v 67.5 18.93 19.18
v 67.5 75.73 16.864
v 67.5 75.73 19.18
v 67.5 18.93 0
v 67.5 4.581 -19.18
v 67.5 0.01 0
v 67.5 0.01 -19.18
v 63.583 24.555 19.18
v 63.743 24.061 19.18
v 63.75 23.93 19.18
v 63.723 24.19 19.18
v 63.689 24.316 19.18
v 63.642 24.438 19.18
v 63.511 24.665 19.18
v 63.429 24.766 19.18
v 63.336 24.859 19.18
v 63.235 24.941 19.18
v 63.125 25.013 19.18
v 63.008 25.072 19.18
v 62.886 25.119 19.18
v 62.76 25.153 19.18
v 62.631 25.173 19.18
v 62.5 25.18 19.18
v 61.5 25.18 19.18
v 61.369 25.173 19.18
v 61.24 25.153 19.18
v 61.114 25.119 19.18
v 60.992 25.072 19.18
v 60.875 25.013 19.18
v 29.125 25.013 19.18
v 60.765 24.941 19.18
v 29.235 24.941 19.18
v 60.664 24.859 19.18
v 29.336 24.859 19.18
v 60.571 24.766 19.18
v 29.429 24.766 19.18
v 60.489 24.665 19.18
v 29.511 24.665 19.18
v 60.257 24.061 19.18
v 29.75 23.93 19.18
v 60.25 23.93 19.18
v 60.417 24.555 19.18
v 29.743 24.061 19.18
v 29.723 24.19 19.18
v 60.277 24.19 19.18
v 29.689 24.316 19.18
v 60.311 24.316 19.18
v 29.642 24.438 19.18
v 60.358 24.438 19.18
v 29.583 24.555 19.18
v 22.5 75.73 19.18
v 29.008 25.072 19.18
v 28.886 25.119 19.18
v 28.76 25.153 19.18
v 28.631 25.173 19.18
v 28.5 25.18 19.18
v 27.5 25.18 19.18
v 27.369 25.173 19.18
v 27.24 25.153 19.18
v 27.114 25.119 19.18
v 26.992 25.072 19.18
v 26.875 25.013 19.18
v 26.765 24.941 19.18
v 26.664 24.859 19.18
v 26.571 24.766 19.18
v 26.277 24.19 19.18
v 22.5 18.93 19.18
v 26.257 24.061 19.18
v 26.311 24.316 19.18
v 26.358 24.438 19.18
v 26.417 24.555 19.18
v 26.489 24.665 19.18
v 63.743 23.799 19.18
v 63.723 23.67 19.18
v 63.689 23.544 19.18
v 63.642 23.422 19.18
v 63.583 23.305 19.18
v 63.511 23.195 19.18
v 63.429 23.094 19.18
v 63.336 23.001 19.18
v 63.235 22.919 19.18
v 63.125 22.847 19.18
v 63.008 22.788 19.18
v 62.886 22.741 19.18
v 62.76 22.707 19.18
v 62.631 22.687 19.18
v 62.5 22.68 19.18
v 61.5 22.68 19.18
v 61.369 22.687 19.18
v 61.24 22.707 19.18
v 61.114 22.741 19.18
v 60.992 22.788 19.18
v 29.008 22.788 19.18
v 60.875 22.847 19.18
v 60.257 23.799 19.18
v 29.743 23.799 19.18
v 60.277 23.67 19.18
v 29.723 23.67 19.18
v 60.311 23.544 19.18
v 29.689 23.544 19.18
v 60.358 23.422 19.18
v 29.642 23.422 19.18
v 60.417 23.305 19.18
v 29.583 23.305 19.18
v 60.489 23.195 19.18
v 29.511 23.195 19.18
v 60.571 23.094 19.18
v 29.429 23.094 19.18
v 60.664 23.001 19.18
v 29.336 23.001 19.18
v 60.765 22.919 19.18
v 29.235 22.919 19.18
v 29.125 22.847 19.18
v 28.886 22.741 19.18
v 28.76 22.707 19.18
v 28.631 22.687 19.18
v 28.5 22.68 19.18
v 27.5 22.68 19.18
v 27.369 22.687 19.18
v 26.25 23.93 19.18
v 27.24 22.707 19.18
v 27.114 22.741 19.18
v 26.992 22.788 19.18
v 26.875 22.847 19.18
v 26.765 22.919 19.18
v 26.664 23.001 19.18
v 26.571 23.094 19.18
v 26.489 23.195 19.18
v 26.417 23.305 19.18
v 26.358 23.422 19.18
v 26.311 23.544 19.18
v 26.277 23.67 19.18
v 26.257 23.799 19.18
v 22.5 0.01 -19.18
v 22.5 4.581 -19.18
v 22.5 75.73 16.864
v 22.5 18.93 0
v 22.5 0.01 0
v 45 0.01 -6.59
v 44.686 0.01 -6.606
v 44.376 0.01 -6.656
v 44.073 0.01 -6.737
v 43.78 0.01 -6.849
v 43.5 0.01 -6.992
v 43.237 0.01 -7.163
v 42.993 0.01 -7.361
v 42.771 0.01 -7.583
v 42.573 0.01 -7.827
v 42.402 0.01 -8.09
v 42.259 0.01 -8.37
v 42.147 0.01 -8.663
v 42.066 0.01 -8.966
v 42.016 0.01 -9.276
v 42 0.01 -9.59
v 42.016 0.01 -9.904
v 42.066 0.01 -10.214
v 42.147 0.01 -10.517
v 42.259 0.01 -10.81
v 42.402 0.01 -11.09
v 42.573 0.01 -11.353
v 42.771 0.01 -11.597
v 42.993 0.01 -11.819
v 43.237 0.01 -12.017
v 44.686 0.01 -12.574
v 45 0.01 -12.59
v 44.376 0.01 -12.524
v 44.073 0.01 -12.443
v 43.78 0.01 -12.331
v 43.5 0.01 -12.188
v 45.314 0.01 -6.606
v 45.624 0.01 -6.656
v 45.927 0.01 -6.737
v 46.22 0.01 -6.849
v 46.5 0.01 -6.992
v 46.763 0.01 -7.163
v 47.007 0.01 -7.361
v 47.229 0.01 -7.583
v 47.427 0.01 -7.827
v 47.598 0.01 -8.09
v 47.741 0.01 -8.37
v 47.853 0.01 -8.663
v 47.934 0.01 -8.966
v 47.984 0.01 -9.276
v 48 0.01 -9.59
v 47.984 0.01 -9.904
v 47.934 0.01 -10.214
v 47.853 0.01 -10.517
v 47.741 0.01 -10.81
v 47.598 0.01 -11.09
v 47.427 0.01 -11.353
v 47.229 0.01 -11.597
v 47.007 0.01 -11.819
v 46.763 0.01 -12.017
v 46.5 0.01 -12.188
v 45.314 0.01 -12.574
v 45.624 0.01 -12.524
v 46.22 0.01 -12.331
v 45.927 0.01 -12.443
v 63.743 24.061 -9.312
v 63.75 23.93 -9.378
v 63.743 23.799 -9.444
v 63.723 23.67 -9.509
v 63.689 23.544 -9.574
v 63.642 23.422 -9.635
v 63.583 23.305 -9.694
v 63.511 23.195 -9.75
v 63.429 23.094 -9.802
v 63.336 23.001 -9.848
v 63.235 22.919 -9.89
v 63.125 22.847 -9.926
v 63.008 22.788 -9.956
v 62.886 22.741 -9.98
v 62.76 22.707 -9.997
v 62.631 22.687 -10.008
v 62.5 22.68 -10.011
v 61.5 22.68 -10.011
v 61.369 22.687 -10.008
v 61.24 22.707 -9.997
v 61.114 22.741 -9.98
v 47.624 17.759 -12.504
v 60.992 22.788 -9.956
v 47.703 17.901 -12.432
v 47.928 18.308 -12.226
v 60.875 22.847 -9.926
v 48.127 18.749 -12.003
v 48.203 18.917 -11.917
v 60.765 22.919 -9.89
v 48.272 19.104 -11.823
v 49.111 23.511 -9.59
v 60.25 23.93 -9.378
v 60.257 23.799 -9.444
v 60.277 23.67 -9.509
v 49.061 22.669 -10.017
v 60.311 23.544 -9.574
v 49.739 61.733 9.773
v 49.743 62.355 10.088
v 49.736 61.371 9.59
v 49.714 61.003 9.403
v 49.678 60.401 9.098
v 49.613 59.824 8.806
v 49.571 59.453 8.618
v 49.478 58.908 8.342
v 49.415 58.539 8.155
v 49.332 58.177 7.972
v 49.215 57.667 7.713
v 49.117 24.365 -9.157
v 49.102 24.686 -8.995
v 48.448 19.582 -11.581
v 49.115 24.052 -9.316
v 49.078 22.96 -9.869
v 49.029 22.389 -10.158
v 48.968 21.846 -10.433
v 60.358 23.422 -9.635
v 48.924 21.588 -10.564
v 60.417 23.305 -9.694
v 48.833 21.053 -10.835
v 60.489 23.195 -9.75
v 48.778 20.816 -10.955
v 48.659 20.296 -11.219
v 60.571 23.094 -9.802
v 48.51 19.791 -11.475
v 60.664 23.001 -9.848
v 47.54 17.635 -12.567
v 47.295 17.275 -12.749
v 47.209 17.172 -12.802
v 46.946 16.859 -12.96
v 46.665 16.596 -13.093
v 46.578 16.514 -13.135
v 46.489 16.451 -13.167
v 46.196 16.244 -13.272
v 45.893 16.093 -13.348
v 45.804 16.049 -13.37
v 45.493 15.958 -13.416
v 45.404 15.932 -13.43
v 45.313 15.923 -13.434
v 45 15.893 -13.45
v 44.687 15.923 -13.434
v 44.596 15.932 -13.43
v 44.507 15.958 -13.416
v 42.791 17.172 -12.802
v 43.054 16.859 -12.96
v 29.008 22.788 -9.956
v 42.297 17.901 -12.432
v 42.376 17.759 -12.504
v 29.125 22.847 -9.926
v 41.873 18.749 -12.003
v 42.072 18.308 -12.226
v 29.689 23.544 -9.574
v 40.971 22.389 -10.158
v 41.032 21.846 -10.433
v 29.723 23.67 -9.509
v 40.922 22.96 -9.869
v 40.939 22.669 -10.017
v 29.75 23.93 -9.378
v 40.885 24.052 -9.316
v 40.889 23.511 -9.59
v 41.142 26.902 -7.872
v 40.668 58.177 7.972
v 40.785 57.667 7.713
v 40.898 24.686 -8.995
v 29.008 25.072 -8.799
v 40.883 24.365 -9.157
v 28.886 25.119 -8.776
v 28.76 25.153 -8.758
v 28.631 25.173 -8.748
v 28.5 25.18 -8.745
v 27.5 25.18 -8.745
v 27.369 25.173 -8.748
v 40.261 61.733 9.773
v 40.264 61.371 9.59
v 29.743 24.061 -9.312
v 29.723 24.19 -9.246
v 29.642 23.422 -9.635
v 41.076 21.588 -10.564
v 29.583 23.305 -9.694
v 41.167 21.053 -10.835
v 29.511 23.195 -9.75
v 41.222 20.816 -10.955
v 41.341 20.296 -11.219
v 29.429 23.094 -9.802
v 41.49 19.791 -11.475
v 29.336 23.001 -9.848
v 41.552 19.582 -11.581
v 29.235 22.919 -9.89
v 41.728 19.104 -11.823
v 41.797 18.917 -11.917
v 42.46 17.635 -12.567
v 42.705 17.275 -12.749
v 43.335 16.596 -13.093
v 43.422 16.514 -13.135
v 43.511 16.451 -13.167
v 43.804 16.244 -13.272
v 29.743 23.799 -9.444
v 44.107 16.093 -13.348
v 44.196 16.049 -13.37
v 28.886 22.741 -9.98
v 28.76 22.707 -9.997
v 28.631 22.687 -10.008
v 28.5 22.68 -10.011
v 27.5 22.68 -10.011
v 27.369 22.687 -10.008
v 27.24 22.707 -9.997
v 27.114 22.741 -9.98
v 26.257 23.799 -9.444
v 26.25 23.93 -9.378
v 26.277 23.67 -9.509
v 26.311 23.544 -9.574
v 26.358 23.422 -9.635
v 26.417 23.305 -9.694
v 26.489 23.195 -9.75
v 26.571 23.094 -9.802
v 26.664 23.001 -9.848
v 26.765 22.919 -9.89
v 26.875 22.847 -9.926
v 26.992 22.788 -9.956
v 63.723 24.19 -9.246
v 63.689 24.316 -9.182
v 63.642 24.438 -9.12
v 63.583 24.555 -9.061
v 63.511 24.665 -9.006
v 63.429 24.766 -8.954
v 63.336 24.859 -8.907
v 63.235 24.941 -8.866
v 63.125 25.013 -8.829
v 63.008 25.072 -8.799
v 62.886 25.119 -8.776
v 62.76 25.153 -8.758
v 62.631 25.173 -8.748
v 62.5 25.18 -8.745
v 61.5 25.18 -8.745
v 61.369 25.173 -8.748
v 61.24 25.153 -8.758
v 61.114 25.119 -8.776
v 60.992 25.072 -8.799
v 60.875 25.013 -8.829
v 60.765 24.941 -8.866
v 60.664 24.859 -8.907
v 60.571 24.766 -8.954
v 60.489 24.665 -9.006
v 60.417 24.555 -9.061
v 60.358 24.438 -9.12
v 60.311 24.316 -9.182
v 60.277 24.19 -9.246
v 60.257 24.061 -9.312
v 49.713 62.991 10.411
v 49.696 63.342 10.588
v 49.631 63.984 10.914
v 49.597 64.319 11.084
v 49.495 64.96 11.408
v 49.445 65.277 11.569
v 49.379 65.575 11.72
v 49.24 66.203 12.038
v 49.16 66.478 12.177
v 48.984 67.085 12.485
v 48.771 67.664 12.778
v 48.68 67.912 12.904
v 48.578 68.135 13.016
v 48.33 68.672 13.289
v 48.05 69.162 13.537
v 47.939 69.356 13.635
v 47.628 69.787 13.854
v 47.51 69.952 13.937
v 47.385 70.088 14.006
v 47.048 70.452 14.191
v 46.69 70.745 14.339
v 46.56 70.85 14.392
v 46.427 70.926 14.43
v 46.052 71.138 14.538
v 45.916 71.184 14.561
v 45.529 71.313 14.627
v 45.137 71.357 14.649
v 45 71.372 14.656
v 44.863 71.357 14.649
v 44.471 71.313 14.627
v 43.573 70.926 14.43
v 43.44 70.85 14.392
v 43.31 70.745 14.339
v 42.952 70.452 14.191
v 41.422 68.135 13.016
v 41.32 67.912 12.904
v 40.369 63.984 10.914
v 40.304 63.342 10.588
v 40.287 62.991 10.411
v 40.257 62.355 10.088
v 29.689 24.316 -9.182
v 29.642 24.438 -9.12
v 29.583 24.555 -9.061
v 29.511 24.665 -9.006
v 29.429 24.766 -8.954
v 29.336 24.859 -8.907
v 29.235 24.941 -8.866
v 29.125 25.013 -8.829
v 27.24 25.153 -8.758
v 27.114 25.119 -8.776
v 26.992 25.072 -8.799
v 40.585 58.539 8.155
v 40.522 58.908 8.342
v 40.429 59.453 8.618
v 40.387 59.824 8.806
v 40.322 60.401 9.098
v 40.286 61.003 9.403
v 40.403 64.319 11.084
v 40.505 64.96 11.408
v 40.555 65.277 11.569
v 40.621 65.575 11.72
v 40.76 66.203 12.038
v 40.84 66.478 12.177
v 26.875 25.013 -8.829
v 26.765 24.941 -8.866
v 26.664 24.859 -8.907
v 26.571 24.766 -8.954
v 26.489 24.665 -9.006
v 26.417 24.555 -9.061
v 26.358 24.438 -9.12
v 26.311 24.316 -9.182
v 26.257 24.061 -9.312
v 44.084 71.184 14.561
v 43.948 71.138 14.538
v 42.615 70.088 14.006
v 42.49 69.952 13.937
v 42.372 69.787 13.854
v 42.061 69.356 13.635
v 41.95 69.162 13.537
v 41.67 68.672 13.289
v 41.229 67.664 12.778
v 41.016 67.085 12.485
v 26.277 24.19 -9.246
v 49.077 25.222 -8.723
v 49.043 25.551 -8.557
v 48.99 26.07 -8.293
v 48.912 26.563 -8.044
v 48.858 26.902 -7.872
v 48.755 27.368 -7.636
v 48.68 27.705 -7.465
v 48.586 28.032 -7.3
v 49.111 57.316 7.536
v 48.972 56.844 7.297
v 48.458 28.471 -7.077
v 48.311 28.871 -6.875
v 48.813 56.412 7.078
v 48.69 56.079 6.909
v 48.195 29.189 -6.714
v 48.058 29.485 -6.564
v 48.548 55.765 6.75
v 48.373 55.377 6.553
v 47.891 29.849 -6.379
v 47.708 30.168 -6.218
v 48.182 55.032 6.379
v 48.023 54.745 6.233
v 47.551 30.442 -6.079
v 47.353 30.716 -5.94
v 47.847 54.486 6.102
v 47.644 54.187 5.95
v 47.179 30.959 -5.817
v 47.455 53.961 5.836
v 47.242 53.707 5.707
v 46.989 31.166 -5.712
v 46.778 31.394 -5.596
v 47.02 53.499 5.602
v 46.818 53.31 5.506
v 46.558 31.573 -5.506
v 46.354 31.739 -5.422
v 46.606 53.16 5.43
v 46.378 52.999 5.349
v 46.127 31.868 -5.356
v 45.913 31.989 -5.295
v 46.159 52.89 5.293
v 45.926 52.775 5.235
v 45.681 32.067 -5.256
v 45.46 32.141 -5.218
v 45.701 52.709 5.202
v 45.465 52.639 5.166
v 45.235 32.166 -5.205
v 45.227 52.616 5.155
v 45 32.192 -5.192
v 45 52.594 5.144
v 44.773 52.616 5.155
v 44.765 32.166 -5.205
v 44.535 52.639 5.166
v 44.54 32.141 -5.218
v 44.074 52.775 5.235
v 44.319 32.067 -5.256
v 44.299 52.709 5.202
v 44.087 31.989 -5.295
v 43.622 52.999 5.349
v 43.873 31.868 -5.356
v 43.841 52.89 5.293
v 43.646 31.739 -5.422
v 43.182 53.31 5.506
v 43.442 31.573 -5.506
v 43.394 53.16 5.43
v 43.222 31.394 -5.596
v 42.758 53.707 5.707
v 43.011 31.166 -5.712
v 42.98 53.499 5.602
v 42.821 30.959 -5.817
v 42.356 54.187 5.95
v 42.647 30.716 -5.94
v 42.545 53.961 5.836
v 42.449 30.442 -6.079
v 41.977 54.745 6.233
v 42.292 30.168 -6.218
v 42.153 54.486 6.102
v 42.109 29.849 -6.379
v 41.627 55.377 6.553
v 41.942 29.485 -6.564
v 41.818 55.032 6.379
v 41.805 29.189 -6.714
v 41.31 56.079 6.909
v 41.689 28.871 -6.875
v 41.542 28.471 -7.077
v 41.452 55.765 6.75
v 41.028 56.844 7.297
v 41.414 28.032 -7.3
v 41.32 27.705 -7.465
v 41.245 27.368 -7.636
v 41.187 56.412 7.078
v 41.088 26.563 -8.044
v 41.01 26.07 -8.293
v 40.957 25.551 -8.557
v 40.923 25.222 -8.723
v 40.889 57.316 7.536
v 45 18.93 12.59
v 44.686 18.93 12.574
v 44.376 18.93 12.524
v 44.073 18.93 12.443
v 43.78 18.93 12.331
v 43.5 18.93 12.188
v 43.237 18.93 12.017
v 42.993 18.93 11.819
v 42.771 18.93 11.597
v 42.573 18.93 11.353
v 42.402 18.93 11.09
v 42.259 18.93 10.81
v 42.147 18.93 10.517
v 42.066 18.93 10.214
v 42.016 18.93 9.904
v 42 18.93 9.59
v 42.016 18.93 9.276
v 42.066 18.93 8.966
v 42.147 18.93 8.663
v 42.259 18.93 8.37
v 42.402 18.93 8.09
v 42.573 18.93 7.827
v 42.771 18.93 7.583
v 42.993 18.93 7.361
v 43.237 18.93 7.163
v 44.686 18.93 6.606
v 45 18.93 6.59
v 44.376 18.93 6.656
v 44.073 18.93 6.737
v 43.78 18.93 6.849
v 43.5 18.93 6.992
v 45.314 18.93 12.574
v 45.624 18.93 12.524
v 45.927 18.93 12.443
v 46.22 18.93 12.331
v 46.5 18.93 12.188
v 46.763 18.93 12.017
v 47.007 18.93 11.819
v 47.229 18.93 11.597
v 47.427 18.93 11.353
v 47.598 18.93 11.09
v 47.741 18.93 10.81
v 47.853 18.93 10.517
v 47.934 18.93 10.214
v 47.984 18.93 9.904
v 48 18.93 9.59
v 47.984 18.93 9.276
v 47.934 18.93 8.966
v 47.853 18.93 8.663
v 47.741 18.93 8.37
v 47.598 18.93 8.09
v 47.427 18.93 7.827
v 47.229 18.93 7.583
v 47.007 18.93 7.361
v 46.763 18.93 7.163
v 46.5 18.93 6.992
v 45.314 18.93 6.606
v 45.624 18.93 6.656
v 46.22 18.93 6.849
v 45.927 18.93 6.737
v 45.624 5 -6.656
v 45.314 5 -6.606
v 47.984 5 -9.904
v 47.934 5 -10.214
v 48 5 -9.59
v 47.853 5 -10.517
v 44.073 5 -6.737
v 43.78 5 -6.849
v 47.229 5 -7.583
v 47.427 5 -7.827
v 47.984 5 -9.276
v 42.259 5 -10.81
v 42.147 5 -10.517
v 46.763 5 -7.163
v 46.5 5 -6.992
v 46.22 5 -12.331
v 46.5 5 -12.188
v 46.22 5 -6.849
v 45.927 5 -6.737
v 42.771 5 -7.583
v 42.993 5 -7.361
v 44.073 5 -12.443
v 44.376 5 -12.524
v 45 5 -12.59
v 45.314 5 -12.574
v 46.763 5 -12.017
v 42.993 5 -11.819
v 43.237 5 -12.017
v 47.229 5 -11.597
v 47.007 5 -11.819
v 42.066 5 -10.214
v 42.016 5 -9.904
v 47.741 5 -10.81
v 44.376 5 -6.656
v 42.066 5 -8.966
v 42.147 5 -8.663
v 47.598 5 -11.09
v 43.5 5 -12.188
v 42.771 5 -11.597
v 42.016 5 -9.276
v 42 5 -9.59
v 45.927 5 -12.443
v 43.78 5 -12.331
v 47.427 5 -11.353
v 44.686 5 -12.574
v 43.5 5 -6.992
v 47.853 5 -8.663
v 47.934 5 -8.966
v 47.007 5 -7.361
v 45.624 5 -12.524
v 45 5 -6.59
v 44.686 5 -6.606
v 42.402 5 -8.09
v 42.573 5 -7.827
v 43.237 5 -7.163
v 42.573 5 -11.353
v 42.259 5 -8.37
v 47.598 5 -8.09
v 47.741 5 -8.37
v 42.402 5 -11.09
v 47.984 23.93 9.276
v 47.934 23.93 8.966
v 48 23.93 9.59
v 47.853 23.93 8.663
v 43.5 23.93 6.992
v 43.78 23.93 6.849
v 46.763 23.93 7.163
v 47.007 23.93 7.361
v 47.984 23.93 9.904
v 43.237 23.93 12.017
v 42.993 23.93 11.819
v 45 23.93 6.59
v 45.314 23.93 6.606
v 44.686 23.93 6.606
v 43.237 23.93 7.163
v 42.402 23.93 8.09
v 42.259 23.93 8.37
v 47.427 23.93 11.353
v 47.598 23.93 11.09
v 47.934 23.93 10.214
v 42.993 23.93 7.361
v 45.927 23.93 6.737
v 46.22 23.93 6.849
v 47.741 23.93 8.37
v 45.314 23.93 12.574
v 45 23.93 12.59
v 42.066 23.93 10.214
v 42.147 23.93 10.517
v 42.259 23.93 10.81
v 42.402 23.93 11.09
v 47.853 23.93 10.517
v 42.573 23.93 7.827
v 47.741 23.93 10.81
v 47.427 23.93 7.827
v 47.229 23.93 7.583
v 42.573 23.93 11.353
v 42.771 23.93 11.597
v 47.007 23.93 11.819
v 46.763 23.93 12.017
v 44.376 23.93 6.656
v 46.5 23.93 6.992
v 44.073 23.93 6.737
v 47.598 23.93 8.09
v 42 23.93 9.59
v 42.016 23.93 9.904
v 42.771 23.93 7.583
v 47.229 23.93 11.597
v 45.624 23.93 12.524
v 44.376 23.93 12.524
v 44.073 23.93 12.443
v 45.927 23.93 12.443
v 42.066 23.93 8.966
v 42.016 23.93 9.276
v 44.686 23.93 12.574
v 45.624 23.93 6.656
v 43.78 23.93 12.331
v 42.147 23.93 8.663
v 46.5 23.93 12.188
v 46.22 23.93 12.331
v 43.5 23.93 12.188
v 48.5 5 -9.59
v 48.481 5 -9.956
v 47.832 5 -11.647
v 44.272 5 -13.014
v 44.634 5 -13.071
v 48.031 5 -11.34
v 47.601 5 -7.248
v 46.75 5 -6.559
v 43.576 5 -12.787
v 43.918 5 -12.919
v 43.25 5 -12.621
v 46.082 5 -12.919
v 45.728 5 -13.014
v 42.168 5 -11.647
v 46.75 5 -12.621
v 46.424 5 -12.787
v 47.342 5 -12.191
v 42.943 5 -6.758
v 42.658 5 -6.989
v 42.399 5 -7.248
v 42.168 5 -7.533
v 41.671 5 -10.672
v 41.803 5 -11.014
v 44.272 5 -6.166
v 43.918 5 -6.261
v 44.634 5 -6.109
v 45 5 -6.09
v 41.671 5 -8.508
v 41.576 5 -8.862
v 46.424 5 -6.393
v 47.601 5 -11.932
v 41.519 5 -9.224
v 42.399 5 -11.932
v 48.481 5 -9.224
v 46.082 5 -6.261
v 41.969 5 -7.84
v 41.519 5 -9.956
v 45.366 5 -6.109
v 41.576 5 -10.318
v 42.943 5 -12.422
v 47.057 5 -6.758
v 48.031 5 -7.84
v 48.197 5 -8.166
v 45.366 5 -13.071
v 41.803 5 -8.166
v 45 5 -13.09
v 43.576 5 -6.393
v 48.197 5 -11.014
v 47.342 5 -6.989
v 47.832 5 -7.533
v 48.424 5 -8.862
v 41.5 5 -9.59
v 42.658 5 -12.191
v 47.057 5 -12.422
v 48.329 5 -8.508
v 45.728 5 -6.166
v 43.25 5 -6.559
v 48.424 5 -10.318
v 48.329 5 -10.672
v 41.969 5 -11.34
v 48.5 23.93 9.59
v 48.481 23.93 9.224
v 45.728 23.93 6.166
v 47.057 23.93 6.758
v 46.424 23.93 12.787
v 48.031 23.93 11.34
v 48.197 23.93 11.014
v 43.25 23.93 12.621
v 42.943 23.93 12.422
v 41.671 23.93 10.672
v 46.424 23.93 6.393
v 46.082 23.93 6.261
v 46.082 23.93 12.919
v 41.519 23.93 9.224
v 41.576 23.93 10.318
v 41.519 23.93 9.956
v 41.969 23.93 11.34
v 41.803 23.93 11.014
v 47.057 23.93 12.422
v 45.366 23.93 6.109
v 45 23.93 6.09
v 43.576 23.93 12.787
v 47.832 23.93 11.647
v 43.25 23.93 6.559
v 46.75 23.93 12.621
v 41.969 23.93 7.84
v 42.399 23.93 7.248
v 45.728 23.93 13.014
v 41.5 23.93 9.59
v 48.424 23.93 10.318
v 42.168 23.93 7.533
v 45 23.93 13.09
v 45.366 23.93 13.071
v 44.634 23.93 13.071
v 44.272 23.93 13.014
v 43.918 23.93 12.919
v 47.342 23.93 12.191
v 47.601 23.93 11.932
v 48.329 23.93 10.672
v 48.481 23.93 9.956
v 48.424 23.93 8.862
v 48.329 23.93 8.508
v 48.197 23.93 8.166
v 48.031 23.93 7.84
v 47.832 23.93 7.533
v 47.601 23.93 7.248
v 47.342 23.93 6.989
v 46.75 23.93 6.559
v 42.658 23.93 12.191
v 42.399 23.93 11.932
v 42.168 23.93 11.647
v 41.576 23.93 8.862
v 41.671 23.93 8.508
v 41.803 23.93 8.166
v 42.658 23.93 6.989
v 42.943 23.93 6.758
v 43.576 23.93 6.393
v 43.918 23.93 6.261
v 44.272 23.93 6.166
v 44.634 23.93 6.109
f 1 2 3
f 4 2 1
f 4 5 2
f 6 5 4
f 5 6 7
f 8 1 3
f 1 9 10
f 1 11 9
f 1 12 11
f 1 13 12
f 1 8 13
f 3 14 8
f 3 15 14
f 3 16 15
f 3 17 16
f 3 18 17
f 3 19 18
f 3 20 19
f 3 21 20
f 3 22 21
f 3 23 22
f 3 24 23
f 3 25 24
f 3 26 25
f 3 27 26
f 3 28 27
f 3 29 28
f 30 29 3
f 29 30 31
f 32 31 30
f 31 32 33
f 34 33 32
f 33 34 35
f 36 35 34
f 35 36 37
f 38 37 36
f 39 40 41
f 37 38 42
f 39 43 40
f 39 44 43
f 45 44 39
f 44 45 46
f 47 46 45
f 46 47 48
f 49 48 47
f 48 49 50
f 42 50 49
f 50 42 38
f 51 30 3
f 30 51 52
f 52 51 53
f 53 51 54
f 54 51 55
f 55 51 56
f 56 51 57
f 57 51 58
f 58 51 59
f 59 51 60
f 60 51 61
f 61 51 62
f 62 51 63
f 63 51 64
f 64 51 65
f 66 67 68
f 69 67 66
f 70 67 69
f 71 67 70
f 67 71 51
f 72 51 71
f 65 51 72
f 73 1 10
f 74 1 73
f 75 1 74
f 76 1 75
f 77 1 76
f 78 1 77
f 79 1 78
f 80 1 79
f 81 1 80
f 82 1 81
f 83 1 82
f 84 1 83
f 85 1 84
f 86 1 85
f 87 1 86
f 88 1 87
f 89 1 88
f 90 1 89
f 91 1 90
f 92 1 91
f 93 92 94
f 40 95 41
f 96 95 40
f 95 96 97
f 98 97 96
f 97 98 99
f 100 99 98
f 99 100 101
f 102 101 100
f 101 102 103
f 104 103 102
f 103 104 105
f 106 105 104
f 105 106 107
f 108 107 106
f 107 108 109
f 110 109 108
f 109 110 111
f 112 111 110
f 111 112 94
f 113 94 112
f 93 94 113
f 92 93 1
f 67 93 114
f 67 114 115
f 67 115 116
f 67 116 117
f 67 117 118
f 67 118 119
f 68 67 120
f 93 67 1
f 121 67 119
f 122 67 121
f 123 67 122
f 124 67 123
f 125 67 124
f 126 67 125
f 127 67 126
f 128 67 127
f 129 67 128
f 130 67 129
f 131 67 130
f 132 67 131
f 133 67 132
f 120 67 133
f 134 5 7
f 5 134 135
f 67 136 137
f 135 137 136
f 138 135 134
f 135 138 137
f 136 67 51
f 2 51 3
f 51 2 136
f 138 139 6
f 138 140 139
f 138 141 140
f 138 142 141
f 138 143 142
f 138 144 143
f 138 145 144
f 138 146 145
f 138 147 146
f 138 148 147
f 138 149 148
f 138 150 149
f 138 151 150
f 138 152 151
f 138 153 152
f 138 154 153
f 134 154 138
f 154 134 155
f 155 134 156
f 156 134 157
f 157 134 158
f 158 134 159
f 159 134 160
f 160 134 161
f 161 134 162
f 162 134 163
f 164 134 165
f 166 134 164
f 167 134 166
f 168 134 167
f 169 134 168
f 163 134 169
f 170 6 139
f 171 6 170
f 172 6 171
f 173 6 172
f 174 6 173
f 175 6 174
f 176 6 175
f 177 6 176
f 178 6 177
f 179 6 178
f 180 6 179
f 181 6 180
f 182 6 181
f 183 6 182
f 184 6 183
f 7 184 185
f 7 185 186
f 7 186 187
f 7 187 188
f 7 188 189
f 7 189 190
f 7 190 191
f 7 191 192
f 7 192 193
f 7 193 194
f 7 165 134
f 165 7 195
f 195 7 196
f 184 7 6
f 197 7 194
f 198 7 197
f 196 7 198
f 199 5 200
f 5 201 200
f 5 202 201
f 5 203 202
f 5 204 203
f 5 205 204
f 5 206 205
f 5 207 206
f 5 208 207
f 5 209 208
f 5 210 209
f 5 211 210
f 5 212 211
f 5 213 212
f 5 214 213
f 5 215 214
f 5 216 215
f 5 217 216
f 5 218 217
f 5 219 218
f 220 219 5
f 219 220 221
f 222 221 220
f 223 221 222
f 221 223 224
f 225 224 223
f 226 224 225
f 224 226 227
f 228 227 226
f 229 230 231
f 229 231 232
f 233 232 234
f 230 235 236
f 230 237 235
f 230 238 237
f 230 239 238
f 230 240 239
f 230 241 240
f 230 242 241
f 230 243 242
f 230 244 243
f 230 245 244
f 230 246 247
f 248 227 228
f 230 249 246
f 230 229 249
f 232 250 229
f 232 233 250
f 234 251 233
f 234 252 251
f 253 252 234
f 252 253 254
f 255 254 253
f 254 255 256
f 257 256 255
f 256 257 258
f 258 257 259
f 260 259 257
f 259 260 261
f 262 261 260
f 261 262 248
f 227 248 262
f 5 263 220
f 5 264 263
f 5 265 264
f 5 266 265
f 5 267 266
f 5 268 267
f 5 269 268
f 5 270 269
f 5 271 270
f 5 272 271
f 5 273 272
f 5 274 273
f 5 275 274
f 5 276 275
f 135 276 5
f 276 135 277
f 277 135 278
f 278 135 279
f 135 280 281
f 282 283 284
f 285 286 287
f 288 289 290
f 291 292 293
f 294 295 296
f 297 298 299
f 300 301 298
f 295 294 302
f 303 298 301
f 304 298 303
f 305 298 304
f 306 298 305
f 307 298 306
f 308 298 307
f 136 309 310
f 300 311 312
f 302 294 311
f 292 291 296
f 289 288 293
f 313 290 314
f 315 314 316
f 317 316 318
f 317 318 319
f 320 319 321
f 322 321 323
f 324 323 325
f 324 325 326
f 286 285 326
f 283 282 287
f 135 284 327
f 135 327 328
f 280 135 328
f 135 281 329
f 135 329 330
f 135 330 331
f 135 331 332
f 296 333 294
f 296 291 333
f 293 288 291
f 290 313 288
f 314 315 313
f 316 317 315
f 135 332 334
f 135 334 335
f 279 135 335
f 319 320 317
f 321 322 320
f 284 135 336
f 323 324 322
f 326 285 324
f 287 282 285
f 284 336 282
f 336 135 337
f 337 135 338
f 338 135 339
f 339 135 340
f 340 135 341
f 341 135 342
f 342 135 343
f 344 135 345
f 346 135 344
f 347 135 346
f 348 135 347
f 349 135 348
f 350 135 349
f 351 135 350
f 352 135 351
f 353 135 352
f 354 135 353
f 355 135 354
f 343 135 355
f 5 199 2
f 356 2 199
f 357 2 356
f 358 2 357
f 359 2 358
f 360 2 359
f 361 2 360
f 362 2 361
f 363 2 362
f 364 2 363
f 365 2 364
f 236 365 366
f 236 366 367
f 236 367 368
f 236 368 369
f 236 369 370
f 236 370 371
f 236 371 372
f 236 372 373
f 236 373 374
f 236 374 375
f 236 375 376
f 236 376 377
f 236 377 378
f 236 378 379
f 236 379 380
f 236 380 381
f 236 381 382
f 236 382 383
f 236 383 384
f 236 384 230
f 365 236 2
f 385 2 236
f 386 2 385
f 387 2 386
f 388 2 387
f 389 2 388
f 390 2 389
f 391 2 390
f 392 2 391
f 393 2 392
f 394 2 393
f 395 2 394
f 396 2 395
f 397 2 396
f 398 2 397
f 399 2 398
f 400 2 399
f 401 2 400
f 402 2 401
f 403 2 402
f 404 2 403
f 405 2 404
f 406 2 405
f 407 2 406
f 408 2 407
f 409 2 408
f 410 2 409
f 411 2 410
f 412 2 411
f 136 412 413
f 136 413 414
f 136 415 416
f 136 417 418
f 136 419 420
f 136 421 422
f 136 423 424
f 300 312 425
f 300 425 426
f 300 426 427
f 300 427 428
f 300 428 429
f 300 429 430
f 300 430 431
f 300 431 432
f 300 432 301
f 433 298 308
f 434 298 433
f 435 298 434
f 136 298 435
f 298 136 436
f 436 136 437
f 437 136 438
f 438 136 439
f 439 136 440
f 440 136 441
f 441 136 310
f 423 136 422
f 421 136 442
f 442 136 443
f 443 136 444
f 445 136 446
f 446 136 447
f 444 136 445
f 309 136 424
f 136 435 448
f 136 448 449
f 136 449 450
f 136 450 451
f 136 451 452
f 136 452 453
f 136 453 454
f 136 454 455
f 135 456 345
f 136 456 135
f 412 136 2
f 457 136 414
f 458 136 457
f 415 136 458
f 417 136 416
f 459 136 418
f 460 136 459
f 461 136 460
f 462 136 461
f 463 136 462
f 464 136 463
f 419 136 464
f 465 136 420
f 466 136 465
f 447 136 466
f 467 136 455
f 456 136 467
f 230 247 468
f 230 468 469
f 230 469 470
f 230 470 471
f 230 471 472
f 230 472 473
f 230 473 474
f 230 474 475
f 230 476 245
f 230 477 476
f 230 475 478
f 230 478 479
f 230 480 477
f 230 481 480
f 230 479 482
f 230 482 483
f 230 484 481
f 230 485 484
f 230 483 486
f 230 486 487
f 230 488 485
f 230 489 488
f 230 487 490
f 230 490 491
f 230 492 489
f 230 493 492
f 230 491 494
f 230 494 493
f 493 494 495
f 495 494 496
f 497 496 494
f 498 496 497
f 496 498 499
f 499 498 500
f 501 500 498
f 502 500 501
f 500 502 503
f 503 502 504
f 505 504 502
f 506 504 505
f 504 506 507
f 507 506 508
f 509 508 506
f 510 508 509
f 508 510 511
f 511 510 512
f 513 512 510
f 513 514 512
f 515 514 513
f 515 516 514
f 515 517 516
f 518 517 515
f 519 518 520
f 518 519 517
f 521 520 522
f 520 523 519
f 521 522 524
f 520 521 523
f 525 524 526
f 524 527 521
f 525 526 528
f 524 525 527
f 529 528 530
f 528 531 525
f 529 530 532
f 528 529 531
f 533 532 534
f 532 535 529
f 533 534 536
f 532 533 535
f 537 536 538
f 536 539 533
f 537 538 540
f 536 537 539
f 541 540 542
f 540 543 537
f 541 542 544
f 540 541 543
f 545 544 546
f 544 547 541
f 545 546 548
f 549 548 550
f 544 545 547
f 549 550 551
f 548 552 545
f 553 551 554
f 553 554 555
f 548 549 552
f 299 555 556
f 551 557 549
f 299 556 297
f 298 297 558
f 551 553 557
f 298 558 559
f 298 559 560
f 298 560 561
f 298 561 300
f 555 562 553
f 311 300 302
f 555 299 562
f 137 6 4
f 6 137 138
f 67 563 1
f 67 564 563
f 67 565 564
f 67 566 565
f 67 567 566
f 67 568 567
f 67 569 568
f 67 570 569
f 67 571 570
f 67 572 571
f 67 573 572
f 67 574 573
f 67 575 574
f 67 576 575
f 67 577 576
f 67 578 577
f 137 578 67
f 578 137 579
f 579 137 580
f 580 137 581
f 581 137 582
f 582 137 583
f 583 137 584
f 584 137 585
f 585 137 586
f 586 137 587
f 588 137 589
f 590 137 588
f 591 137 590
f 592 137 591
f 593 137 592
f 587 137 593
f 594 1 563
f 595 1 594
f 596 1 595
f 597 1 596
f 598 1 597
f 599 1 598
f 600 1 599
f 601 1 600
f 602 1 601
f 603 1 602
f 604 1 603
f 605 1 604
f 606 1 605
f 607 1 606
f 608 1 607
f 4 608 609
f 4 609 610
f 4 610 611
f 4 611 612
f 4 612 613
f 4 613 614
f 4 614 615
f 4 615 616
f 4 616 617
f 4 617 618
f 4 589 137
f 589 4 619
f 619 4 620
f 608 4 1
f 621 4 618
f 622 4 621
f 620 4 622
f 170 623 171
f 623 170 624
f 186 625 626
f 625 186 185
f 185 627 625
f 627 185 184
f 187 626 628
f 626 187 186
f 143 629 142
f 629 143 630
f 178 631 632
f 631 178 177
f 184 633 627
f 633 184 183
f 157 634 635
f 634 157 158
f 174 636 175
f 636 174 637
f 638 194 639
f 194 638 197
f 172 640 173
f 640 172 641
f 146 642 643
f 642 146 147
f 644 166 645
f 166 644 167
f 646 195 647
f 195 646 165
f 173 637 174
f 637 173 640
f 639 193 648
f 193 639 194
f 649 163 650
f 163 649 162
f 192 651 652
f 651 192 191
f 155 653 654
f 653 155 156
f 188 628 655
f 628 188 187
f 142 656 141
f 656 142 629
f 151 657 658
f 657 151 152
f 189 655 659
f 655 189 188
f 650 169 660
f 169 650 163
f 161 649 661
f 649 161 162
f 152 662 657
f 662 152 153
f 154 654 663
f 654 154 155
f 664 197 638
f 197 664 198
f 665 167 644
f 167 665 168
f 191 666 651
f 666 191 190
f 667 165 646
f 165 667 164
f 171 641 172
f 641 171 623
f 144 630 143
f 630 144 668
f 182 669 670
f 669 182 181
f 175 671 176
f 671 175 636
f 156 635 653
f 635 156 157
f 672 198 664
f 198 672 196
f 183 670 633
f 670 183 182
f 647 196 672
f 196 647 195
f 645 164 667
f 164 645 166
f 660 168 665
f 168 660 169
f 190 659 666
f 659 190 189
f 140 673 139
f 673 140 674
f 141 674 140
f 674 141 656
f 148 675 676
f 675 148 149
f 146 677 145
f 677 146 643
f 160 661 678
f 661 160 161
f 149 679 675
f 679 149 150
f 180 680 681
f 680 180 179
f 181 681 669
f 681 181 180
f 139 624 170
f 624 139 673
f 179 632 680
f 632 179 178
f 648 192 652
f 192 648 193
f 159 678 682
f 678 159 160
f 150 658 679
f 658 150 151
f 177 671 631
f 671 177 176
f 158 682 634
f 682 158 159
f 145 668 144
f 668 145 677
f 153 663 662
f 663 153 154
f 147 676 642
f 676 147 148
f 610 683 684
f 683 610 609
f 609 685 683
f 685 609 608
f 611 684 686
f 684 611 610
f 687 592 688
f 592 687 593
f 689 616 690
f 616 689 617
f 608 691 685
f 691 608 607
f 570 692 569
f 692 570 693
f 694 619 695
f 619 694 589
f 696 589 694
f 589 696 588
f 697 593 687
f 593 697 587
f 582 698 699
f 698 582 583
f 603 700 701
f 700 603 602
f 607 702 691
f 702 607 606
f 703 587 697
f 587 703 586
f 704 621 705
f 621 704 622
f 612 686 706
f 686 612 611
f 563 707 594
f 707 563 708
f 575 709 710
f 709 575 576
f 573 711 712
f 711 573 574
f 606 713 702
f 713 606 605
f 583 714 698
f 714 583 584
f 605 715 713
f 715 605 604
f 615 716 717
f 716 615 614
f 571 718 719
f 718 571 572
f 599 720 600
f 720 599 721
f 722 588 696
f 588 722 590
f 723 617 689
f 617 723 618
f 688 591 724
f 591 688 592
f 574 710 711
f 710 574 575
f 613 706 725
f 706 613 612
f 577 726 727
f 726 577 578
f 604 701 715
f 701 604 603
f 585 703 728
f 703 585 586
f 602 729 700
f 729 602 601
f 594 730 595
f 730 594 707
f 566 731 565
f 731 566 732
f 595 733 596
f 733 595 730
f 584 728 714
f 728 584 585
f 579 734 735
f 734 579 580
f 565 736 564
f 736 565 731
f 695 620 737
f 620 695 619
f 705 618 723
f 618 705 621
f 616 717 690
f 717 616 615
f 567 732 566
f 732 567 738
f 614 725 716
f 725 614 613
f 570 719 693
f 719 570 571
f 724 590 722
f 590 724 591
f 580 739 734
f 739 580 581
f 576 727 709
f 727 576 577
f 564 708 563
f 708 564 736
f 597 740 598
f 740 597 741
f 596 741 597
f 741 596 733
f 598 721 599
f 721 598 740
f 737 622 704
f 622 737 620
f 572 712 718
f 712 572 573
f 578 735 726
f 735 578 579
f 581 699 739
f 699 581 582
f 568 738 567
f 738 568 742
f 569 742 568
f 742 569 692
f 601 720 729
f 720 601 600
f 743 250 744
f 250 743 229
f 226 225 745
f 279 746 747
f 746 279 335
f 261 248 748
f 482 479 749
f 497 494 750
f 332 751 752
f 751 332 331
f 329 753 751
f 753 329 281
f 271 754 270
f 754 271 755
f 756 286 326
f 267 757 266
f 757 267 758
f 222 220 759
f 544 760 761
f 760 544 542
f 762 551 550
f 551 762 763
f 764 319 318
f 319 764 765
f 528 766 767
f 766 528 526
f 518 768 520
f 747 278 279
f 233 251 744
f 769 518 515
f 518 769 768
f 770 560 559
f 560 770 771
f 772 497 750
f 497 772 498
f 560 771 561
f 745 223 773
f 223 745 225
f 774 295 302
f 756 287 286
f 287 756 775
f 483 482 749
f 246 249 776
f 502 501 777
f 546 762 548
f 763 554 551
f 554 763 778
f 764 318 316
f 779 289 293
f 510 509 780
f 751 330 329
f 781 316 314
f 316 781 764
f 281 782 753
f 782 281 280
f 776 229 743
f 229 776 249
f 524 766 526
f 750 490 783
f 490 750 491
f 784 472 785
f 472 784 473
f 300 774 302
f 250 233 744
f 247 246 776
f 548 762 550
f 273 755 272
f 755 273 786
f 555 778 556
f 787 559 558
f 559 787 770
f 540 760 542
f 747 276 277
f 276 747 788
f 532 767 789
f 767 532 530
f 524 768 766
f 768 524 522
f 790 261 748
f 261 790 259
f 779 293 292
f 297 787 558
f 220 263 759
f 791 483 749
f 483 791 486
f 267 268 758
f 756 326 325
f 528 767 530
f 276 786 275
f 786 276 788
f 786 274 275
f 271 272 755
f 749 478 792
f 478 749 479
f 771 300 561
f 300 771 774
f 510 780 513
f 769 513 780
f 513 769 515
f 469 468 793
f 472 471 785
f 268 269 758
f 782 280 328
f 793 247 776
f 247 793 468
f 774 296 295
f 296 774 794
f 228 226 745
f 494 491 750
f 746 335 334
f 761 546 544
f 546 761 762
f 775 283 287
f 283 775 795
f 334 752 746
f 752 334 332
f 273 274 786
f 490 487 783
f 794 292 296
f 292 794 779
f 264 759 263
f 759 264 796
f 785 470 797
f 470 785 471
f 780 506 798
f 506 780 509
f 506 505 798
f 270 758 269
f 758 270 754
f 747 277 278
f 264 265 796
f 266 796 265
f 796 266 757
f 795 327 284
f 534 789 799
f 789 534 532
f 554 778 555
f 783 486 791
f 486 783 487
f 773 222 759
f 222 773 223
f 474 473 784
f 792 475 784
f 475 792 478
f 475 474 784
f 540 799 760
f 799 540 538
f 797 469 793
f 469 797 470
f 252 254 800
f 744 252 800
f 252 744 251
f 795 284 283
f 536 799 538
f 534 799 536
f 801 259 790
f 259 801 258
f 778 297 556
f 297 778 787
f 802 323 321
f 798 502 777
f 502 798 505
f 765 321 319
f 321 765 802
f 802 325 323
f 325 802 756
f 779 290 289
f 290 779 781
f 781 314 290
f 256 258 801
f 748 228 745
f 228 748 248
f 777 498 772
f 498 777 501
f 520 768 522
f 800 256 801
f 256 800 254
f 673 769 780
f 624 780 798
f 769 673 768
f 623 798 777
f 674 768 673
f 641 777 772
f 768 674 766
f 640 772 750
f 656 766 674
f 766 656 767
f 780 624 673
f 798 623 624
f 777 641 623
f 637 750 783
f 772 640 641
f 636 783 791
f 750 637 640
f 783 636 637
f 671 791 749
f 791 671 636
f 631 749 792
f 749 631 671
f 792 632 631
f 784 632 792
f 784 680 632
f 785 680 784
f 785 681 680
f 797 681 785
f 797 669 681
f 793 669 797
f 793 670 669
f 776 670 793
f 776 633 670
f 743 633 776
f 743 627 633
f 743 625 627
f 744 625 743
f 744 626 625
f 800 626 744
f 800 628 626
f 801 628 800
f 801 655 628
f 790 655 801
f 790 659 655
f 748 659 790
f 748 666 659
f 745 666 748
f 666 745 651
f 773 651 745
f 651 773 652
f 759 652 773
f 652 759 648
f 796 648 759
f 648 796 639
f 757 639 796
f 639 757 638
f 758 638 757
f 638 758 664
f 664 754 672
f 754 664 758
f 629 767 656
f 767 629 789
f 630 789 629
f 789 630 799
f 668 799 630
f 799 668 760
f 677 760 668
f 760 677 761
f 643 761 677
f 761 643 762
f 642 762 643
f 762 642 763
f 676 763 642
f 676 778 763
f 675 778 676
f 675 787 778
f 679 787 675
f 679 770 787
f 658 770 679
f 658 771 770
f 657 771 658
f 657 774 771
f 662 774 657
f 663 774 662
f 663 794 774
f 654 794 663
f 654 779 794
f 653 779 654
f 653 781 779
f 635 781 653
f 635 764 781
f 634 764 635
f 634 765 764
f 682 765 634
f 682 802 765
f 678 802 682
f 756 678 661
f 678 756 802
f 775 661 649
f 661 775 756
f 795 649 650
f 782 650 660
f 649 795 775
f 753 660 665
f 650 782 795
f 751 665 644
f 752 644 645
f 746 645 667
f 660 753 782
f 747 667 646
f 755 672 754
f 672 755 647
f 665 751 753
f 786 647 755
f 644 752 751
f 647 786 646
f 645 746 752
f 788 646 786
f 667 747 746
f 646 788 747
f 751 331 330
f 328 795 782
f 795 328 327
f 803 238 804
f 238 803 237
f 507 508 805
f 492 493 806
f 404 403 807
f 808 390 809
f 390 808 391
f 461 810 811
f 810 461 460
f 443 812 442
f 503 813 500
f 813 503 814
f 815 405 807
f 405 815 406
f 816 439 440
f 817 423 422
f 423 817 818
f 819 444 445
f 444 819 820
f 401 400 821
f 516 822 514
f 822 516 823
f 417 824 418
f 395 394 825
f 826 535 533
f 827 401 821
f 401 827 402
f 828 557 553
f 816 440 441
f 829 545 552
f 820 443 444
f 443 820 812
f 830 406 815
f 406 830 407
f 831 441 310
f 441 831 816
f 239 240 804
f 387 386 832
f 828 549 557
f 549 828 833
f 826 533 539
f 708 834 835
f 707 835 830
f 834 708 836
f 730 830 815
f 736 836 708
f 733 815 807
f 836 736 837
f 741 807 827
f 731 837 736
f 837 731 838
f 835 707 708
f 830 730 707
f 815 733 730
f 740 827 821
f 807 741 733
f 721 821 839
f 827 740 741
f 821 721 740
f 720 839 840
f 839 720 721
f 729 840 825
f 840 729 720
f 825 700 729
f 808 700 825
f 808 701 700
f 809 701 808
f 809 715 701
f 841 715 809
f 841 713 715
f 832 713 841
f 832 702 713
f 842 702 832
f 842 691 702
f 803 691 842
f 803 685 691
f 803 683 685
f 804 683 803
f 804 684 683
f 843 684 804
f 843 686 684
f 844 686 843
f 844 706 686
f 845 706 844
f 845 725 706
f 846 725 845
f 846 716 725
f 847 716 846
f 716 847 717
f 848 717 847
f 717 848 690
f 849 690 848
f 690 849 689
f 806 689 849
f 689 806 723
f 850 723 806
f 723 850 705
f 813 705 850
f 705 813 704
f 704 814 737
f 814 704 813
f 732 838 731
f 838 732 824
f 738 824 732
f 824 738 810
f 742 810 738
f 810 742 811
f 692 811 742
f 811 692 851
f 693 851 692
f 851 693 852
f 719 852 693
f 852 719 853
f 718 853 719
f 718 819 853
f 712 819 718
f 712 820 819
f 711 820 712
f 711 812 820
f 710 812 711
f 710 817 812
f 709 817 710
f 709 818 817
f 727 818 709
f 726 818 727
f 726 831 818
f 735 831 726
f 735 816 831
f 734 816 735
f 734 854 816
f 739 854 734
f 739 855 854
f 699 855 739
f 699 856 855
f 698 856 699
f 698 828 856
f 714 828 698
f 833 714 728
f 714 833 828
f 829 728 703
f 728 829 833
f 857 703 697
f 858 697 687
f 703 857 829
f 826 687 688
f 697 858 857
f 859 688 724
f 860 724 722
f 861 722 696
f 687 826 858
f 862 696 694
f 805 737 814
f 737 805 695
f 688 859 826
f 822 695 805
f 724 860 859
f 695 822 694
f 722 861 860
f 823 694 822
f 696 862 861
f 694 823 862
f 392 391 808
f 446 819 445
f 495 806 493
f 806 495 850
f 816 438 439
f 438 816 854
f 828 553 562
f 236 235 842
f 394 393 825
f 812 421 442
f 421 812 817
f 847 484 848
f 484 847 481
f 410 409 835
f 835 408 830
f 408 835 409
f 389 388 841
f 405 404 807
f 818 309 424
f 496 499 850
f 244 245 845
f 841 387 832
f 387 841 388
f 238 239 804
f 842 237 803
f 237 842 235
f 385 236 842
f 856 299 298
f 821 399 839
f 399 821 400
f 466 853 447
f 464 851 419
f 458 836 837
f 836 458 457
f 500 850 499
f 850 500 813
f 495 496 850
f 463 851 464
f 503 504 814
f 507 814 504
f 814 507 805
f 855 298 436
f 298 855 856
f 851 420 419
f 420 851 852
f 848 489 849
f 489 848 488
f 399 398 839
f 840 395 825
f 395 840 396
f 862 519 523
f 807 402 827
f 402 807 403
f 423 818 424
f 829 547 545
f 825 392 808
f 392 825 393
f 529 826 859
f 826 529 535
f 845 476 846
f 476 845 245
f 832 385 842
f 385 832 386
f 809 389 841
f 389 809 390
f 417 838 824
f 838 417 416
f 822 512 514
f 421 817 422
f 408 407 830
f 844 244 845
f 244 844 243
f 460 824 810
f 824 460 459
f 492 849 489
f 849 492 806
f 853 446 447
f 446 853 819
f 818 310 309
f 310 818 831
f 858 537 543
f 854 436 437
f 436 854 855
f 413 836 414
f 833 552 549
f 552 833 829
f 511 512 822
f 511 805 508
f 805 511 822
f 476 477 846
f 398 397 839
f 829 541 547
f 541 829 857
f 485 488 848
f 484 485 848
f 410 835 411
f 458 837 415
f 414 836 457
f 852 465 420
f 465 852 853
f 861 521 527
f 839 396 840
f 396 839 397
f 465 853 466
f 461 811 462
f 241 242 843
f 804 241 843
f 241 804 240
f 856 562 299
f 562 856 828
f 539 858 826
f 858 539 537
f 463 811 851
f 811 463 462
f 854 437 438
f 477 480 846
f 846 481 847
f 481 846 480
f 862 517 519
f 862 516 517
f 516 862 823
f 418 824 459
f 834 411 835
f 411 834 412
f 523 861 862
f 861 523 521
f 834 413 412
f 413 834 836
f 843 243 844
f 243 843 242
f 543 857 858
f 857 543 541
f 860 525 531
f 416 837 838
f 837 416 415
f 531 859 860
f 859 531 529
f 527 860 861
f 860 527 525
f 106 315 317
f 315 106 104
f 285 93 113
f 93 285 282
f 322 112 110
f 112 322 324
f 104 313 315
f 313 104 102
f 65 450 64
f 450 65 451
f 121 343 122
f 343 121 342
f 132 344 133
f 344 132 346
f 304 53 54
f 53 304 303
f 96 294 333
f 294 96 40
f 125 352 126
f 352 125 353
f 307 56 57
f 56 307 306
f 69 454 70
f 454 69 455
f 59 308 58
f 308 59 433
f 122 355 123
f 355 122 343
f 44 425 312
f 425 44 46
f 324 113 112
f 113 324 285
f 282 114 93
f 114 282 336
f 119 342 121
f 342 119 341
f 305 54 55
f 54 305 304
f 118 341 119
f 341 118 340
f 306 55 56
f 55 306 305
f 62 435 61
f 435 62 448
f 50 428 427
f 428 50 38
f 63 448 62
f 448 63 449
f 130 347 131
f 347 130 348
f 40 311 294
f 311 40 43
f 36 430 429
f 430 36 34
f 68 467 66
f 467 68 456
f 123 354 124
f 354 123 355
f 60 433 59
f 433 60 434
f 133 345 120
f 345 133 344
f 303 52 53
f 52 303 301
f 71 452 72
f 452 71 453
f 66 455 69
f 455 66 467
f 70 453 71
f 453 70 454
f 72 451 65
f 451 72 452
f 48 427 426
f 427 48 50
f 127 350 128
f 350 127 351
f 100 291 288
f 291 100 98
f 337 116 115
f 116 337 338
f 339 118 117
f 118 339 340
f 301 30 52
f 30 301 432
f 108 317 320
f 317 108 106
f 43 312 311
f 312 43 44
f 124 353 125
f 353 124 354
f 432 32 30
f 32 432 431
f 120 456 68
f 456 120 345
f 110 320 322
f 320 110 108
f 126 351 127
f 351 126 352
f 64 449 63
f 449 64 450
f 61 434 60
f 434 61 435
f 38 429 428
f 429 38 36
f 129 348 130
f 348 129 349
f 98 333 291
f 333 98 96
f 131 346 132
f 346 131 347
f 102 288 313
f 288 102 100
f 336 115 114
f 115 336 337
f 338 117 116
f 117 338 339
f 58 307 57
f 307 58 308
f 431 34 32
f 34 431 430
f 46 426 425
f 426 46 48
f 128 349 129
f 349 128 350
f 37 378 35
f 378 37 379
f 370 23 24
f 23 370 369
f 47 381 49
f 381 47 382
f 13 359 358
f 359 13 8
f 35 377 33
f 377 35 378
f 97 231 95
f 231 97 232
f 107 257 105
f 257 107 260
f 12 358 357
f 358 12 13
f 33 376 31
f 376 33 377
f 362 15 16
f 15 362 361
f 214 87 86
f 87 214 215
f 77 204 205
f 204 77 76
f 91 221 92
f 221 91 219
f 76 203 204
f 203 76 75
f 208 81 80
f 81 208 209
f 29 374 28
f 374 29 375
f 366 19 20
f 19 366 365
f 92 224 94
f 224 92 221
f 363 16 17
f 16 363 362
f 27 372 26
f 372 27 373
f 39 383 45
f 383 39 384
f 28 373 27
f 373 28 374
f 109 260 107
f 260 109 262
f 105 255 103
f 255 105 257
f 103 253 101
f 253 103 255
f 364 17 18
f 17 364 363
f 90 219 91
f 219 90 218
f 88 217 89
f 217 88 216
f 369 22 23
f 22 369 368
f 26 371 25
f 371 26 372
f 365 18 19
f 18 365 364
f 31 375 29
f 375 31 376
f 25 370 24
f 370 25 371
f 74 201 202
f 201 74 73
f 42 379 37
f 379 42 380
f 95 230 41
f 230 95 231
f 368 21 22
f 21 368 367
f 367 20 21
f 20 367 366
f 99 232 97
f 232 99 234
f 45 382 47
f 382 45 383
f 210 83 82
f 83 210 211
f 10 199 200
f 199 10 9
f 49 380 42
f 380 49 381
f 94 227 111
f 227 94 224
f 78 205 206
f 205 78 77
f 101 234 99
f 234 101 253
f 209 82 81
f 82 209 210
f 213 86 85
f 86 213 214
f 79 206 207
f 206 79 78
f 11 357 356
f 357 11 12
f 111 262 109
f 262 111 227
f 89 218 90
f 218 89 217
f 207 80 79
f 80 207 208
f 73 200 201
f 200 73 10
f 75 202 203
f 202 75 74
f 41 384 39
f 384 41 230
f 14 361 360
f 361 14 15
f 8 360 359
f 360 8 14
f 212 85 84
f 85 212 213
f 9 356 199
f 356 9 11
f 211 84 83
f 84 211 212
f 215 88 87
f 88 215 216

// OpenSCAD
// file: ../lib/utils.scad
///< Utilities

function rand_clr() = rands( 0,1,3 );

///< Length conversions
function in2mm( i ) = ( i * 25.4 ); 
function mm2in( m ) = ( m / 25.4 );

/// This is pulled from stackoverflow
/// https://stackoverflow.com/questions/45826208/openscad-rotating-around-a-particular-point

// rotate as per a, v, but around point pt
module rotate_about_pt(z, y, pt) {
    translate(pt)
        rotate([0, y, z ])
            translate(-pt)
                children();   
}

function adjust_z_offset( v, z ) = [for (i=[0:(len(v)-1)]) v[i]+[0,0,z]] ;

///< For each child, translate child by <p> point in points
module foreach_translate(points ){
	for (p=points){
		translate(p) children();
	}
}
// file: ../lib/math.scad
///< Math scad module


///< Find the hypotenuse from two sides of a right triangle
function hyp_from_sides( a, b ) = sqrt( pow( a, 2 ) + pow( b, 2 ) );

///< Find equal sides from hypotenuse of a right triangle
function sides_from_hyp(h) = sqrt( pow( h, 2 ) / 2 );

///< Find A from hypotenuse and B
function a_from_hb( h, b ) = sqrt( pow( h, 2 ) - pow( b, 2 ) );

function dist_2d( pt2, pt1 ) = sqrt(pow(( pt2[0]-pt1[0] ),2) + pow(( pt2[1]-pt1[1]),2) );

function mid_pt_2d( pt2, pt1 ) = [( pt1[0]+pt2[0] )/2, ( pt1[1]+pt2[1] )/2, 0 ];
///< Test for math functions

A = 3;
B = 4;
echo("Given A=", A, "and B=", B );
H = hyp_from_sides( A, B );
echo("Hypotenuse=", H );
echo("Calc Correct = ", (H == 5) );

echo("Given H=", H, " which is a hypotenuse with equal sides" );
echo( "the sides=", sides_from_hyp( H ) );

echo("Given H=", H, "B=", 4 );
echo("A=", a_from_hb( H, 4 ) );

echo("Distance from [-1,1] and [3,4] = ", dist_2d( [-1,1],[3,4]) );

///< Find the sum of a vector <vect> starting from <s> and continuing to <i>
function sumv( vect, i, s=0 ) = ( i == s ? vect[ i ] : vect[ i ] + sumv( vect, i - 1, s ) );
vec = [ 1, 2, 3, 4 ];
l = len( vec )-1;
echo( "Sum vec = ", sumv( vec, l, 0 ) );

///< Find the average of a vector <vect> starting at <s>
function average( vect, s=0 ) = (len( vect ) == 0 ? 0 : ( sumv( vect, len( vect ) - 1, s )/len(vect) ) );
echo( "Ave vec = ", average( vec ) );
vec2 = [];
echo( "Ave vec2 = ", average( vec2 ) );
// main file
///< Object definition
use <../lib/math.scad>;
use <../lib/utils.scad>;


/*
Module: Name
   Preamble and description

*/

/*
Parameters
*/

// Finish
$fn = 60.0;

// WallExtrusion parameters
// Wall Extrusion Width (X)
wallex_w = 90.0; // [0:1:100]
// Wall Extrusion Depth (Y)
wallex_d = 18.93; // [0:1:100]
// Wall Extrustion Height (Z)
wallex_h = 38.36; // [0:1:100]
wallex_hd = 5;
wallex_hl = wallex_h;
wallex_hp = [
            [ wallex_w*1/4, wallex_h/2, 0 ],
            [ wallex_w*3/4, wallex_h/2, 0 ]
            ];


// Wall Mount parametsers
// Wall mount width (X)
wallmnt_w = 45.0; // [0:0.01:300]
// Wall mount depth (Y)
wallmnt_d = 75.72; // [0:0.01:100] 
// Wall mount height (Z)
wallmnt_h = 38.36; // [0:0.01:100]

// Slide Mount Parameters
// Slide Hole Diameter
slide_hole_d = 2.5; // [0: 0.01: 10 ]
// Slide Hole Height
slide_hole_h = 100; // [0: 1: 100 ]

// Slide Hole points
slide_hole_pts1 =  [
             [ wallex_w*1/4+5.0,           wallex_d + 5.0, 0.0 ],
             [ wallex_w*1/4+6.0,           wallex_d + 5.0, 0.0 ],
             ];

slide_hole_pts2 =  [
             [ wallex_w*1/4+wallmnt_w-5.0, wallex_d + 5.0, 0.0 ],
             [ wallex_w*1/4+wallmnt_w-6.0, wallex_d + 5.0, 0.0 ],
             ];

// Mounting Parameters
// Mount Hole Diameter
mnt_hole_d = 6.0; // [ 2 : 0.01: 7 ]
// Mount Hole Height
mnt_hole_h = wallmnt_d*2;  // [ 5: 1: 100 ]
// Mount Hole points
mnt_hole_points = [
                  [ wallex_w/2.0, 0,          -wallex_h/4 ],
                  [ wallex_w/2.0, wallex_d/2,  wallex_h/4 ],
                  ];

// Mount thickness
mnt_thickness = 5.00;
// Mount Chamfer Diameter
mnt_chmfr_d1 = 7;
mnt_chmfr_d2 = 12; //mnt_chmfr_d1 * 2;
// Mount Chamfer Height
mnt_chmfr_h = wallmnt_d;
// Mount Chamfer Points
mnt_chmfr_points = [
                    [wallex_w/2.0,mnt_thickness,         -wallex_h/4],
                    [wallex_w/2.0,mnt_thickness+wallex_d, wallex_h/4],
                    ];

///< Parameters after this are hidden from the customizer
module __Customizer_Limit__(){}

///< hole pattern
module hole_pattern( d, h, points, center = true ){
    for( p = points ){
        rotate( [90,0,0] )
        translate( p )            
            cylinder( d = d, h  = h, center = center );
    }
}

///< extrusion
module wall_extrusion( width, depth, height, hole_d, hole_h, hole_points ){
    difference(){
        cube( [width, depth, height] );
        //color("red")hole_pattern( d = hole_d, h = hole_h, points = hole_points );
    }
}


module mounting_holes( points, d, h, center = false ){
    for (p = points ){
        translate( p )
            rotate( [-90,0,0] )
            cylinder( d = d, h = h, center = center );
    }
}

module mounting_chamfer( points, d1, d2, h, center = false ){
    for( p = points ){
        translate( p )
            rotate( [-90,0,0] )
            cylinder( d1 = d1, d2 = d2, h = h, center = center );
    }
}

module adjustable_holes( points, d, h, center = true ){
    hull(){
        for( p = points ){
            translate( p )
                cylinder( d = d, h = h, center = center );
        }
    }
}

module wall_mount( width, depth, height ){
    diag = sqrt( pow( depth, 2 ) + pow( height, 2 ) );
    angle = asin( height / diag );
    
    difference(){
        color( "orange" )
            translate( [ wallex_w/4, 0.01, -wallex_h/2 ] )
            cube( [ width, depth, height ] );
        rotate( [ angle, 0, 0 ] )
        color( "blue" )
            translate( [ wallex_w/4, -depth/2, -wallex_h/2-height ] )
            cube( [ width+0.1, depth*2, height ] );
        #wall_extrusion( wallex_w, wallex_d, wallex_h, wallex_hd, wallex_hl, wallex_hp );
    }
}

///< Build object
//wall_extrusion( wallex_w, wallex_d, wallex_h, wallex_hd, wallex_hl, wallex_hp );
difference(){
    wall_mount( wallmnt_w, wallmnt_d, wallmnt_h );
    color( "purple" )
        #adjustable_holes( slide_hole_pts1, slide_hole_d, slide_hole_h );
        #adjustable_holes( slide_hole_pts2, slide_hole_d, slide_hole_h );
    color( "teal" )
        #mounting_holes( mnt_hole_points, mnt_hole_d, mnt_hole_h );
    color( "green")
        mounting_chamfer( mnt_chmfr_points, mnt_chmfr_d1, mnt_chmfr_d2, mnt_chmfr_h );
}
                           
